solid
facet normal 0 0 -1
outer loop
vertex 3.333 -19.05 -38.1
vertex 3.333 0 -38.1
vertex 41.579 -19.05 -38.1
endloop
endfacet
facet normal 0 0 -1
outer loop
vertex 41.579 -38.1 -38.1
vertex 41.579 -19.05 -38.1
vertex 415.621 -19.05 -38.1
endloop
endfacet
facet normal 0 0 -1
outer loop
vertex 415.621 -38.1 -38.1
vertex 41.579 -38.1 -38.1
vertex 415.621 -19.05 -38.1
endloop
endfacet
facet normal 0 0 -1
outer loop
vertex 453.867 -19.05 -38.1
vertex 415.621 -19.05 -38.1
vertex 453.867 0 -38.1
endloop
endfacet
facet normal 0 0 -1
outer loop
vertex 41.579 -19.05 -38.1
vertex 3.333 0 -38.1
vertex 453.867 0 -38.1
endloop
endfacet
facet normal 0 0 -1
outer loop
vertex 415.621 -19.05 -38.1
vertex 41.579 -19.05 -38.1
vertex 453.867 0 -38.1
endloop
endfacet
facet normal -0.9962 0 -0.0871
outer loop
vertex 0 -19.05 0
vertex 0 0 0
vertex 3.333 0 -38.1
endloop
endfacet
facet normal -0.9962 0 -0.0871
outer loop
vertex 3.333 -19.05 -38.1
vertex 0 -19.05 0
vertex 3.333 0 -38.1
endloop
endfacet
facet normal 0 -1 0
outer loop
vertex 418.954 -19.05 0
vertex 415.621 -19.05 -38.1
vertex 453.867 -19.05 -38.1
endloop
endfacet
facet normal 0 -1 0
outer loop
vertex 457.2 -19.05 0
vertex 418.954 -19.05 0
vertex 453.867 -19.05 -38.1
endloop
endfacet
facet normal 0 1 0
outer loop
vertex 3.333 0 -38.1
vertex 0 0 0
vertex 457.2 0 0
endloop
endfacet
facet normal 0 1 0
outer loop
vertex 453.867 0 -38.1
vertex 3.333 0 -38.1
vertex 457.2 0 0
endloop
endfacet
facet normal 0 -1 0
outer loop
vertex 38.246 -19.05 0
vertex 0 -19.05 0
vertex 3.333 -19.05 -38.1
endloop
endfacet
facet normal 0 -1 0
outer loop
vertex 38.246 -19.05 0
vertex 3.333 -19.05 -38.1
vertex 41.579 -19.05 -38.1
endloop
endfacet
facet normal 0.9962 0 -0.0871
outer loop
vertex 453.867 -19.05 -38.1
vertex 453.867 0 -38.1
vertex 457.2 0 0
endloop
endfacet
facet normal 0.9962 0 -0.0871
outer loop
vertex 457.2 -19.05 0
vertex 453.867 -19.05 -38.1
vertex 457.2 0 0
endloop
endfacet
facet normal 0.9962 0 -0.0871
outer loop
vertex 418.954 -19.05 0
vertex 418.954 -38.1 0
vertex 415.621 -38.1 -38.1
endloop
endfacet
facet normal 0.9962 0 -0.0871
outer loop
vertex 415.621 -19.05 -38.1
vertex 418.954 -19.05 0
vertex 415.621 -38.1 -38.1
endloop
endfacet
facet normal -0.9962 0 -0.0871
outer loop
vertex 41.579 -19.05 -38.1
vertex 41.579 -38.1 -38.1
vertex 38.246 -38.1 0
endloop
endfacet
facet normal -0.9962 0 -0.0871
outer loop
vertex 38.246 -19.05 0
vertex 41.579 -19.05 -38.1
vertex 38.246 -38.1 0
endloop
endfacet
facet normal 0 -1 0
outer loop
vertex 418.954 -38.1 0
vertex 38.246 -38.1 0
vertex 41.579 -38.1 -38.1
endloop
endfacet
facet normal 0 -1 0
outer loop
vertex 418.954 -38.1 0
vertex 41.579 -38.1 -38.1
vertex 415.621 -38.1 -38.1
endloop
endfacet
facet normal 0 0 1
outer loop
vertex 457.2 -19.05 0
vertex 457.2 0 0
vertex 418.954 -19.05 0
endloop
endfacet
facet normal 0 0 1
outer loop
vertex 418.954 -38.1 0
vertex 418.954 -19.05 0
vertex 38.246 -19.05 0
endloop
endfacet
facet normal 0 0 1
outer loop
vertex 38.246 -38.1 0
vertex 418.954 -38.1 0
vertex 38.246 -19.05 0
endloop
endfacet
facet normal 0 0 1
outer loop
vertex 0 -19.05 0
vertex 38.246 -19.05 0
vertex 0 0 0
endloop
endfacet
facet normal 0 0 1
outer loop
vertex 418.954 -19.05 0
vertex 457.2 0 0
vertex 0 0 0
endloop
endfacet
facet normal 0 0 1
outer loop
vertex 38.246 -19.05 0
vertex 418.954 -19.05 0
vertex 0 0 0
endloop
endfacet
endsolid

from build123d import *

# Parameters (mm, degrees)
F1_DEPTH = 38.1
F3_DEPTH = 19.05
F5_DEPTH = 19.05


with BuildPart() as f1:
    # F0 (on Front) → F1 (new body)
    with BuildSketch(Plane.XZ):
        Polygon((457.2, 0), (0, 0), (3.333318, -38.1), (453.866682, -38.1), align=None)
    extrude(amount=F1_DEPTH)

    # F2 (on face) → F3 (cut)
    with BuildSketch(Plane.XZ.offset(38.1)):
        Polygon((457.2, 0), (418.954464, 0), (415.621146, -38.1), (453.866682, -38.1), align=None)
    extrude(amount=-F3_DEPTH, mode=Mode.SUBTRACT)

    # F4 (on face) → F5 (cut)
    with BuildSketch(Plane.XZ.offset(38.1)):
        Polygon((41.578854, -38.1), (38.245536, 0), (0, 0), (3.333318, -38.1), align=None)
    extrude(amount=-F5_DEPTH, mode=Mode.SUBTRACT)


solid = f1.part
